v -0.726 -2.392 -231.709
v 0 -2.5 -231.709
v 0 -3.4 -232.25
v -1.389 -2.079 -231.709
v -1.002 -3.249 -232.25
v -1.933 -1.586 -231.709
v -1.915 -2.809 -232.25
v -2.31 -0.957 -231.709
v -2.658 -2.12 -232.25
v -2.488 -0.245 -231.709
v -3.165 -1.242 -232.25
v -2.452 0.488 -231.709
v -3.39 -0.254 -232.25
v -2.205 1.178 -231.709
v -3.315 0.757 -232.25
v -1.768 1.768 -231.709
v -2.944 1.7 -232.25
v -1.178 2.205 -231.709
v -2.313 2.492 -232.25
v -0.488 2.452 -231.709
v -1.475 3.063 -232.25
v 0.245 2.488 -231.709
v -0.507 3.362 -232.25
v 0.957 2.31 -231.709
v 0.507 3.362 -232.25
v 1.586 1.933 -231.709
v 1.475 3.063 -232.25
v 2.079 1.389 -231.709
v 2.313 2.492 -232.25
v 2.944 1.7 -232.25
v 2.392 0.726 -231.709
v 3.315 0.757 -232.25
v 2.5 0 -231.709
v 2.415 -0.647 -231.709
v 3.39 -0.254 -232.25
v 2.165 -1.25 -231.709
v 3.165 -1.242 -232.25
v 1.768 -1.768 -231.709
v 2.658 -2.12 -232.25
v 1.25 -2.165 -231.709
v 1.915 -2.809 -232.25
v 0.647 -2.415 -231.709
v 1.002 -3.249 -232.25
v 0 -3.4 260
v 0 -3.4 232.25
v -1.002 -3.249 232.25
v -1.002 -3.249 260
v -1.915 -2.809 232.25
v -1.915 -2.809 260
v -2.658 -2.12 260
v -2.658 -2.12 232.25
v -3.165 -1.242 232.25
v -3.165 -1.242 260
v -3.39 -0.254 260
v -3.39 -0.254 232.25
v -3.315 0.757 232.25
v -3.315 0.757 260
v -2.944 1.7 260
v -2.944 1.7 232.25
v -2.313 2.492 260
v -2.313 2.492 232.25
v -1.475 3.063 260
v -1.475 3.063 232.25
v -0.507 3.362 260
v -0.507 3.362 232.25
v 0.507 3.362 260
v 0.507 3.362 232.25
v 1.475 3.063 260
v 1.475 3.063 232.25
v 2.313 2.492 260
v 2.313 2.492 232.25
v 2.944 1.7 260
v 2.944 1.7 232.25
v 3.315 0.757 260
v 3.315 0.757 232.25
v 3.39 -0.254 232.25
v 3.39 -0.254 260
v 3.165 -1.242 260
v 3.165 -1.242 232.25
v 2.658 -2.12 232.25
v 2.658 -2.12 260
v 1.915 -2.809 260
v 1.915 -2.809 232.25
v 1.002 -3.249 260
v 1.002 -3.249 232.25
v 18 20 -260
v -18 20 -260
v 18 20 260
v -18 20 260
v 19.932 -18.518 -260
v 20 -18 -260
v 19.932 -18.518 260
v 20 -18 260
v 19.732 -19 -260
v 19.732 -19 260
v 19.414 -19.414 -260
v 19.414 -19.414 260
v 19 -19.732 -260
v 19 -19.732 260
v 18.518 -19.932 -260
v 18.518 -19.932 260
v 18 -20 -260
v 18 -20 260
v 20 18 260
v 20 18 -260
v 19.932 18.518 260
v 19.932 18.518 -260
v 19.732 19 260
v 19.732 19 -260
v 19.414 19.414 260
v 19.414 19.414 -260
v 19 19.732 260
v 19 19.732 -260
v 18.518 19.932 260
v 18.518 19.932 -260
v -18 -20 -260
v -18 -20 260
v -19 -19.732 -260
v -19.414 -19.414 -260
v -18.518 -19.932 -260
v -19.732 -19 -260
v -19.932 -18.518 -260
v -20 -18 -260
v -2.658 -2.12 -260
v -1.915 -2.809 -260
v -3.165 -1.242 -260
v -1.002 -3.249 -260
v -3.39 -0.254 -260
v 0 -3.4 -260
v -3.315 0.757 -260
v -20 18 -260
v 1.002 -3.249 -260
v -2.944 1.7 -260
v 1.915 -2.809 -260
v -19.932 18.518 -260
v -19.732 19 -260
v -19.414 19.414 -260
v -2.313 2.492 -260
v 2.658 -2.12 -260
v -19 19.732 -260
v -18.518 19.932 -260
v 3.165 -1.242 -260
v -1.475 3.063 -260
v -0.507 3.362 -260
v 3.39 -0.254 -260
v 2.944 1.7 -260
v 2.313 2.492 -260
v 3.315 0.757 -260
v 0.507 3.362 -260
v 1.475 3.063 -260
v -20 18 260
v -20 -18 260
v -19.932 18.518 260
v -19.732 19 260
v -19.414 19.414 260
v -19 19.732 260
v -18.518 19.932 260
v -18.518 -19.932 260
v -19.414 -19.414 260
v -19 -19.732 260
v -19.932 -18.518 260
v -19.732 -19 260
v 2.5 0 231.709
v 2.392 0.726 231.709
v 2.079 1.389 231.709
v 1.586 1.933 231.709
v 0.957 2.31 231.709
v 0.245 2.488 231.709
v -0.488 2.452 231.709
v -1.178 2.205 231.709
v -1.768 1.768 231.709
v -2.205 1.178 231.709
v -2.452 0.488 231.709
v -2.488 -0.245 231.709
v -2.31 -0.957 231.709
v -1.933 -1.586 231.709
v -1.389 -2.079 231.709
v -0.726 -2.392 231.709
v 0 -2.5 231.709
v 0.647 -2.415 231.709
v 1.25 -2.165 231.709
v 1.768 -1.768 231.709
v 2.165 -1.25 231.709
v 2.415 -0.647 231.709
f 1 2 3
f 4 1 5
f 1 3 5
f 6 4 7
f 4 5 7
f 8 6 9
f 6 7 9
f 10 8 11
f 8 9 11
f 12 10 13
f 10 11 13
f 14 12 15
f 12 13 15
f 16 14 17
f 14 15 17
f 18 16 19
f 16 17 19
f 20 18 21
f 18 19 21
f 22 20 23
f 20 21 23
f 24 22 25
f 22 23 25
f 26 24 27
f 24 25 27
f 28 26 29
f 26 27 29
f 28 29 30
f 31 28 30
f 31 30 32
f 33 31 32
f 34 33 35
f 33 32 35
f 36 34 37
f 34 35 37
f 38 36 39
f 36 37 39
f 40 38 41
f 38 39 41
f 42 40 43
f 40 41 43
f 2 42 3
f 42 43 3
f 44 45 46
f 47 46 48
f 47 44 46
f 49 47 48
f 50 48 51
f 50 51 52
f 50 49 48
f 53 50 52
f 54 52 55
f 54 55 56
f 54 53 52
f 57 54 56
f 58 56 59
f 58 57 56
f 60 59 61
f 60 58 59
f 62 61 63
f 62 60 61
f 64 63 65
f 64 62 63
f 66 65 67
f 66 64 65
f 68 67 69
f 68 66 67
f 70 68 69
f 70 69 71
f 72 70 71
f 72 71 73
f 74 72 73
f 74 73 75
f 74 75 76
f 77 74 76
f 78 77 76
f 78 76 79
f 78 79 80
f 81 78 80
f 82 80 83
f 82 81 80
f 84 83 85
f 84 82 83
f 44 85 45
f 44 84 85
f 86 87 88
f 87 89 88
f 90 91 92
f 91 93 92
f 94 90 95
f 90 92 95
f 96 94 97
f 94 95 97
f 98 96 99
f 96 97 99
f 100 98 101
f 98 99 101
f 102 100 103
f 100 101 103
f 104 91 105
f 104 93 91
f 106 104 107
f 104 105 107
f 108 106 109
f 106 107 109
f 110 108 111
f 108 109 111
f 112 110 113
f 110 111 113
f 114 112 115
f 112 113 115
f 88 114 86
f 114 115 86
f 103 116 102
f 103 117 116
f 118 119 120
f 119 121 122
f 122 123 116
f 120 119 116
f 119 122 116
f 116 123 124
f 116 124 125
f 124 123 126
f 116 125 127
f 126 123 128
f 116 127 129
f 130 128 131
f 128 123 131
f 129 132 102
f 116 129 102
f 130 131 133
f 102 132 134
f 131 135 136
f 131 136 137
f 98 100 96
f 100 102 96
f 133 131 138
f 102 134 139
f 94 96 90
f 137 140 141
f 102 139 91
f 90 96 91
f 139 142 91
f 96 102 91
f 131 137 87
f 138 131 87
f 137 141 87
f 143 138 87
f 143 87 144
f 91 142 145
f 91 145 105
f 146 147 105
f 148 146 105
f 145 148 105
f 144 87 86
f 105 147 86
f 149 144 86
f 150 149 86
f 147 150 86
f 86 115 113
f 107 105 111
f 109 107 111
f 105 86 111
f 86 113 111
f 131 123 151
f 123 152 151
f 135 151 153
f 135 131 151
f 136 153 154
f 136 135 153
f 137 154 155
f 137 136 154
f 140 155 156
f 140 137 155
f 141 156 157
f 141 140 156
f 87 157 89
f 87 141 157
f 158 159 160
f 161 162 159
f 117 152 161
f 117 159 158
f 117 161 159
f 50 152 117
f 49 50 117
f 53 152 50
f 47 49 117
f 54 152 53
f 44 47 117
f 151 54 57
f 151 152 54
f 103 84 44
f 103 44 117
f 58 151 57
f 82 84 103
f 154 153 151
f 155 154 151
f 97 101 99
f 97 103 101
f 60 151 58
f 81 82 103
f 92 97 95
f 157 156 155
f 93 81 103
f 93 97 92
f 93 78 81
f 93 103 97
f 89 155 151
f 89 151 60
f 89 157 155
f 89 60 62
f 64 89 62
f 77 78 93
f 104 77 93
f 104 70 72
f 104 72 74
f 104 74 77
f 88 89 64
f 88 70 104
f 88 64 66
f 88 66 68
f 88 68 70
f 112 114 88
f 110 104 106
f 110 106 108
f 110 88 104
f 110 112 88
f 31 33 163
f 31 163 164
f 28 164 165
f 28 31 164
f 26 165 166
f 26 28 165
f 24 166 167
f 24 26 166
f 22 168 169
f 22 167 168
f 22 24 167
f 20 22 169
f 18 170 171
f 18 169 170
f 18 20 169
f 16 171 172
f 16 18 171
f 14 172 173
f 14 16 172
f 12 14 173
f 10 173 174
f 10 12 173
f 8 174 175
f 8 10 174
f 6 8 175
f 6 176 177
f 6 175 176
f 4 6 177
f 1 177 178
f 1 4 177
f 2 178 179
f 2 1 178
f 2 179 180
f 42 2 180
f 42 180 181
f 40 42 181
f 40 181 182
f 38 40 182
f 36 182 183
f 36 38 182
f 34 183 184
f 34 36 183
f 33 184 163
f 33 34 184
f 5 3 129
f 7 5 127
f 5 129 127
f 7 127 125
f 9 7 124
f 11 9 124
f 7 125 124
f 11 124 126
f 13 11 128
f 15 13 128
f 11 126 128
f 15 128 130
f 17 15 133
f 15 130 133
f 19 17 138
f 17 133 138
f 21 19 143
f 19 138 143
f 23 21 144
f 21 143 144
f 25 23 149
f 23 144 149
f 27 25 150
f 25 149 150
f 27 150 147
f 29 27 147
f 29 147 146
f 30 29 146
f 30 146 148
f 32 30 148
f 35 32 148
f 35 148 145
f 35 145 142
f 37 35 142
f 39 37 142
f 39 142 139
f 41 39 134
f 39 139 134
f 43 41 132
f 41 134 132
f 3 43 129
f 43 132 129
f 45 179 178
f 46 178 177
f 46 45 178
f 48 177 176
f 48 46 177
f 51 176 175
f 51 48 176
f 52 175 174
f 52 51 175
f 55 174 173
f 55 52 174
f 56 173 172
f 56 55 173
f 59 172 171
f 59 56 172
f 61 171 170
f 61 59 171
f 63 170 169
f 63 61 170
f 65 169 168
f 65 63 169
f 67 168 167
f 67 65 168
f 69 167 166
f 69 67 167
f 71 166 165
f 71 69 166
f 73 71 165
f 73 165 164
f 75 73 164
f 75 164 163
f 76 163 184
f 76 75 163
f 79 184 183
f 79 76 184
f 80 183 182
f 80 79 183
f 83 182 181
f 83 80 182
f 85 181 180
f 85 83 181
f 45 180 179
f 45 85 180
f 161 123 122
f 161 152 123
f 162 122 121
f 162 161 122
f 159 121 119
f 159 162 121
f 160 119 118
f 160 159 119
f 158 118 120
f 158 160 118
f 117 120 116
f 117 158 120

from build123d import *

# Parameters (mm, degrees)
SKETCH1_W           = 40
SKETCH1_H           = 40
SKETCH1_R           = 2.5
BOSS_EXTRUDE1_DEPTH = 260
FILLET1_R           = 2


with BuildPart() as part:
    # Sketch1 → Boss-Extrude1 (new, symmetric)
    with BuildSketch(Plane.XY):
        Rectangle(SKETCH1_W, SKETCH1_H)
        Circle(SKETCH1_R, mode=Mode.SUBTRACT)
    extrude(amount=BOSS_EXTRUDE1_DEPTH, both=True)

    # Fillet1
    fillet1_edges = [part.edges().sort_by_distance(p)[0] for p in [
        (20, -20, 0),
        (-20, -20, 0),
        (-20, 20, 0),
        (20, 20, 0),
    ]]
    fillet(fillet1_edges, radius=FILLET1_R)

    # Sketch9 → M8 Tapped Hole1 (revolve, cut)
    with BuildSketch(Plane(origin=(0, 0, 260), x_dir=(0, -1, 0), z_dir=(1, 0, 0))):
        Polygon((0, 0), (0, 29.792926105), (3.4, 27.75), (3.4, 0), align=None)
    m8_tapped_hole1 = revolve(axis=Axis((0, 0, 266.35), (0, 0, -1)), mode=Mode.SUBTRACT)

    # Mirror1: M8 Tapped Hole1 across plane
    add(m8_tapped_hole1.mirror(Plane.XY), mode=Mode.SUBTRACT)


solid = part.part
